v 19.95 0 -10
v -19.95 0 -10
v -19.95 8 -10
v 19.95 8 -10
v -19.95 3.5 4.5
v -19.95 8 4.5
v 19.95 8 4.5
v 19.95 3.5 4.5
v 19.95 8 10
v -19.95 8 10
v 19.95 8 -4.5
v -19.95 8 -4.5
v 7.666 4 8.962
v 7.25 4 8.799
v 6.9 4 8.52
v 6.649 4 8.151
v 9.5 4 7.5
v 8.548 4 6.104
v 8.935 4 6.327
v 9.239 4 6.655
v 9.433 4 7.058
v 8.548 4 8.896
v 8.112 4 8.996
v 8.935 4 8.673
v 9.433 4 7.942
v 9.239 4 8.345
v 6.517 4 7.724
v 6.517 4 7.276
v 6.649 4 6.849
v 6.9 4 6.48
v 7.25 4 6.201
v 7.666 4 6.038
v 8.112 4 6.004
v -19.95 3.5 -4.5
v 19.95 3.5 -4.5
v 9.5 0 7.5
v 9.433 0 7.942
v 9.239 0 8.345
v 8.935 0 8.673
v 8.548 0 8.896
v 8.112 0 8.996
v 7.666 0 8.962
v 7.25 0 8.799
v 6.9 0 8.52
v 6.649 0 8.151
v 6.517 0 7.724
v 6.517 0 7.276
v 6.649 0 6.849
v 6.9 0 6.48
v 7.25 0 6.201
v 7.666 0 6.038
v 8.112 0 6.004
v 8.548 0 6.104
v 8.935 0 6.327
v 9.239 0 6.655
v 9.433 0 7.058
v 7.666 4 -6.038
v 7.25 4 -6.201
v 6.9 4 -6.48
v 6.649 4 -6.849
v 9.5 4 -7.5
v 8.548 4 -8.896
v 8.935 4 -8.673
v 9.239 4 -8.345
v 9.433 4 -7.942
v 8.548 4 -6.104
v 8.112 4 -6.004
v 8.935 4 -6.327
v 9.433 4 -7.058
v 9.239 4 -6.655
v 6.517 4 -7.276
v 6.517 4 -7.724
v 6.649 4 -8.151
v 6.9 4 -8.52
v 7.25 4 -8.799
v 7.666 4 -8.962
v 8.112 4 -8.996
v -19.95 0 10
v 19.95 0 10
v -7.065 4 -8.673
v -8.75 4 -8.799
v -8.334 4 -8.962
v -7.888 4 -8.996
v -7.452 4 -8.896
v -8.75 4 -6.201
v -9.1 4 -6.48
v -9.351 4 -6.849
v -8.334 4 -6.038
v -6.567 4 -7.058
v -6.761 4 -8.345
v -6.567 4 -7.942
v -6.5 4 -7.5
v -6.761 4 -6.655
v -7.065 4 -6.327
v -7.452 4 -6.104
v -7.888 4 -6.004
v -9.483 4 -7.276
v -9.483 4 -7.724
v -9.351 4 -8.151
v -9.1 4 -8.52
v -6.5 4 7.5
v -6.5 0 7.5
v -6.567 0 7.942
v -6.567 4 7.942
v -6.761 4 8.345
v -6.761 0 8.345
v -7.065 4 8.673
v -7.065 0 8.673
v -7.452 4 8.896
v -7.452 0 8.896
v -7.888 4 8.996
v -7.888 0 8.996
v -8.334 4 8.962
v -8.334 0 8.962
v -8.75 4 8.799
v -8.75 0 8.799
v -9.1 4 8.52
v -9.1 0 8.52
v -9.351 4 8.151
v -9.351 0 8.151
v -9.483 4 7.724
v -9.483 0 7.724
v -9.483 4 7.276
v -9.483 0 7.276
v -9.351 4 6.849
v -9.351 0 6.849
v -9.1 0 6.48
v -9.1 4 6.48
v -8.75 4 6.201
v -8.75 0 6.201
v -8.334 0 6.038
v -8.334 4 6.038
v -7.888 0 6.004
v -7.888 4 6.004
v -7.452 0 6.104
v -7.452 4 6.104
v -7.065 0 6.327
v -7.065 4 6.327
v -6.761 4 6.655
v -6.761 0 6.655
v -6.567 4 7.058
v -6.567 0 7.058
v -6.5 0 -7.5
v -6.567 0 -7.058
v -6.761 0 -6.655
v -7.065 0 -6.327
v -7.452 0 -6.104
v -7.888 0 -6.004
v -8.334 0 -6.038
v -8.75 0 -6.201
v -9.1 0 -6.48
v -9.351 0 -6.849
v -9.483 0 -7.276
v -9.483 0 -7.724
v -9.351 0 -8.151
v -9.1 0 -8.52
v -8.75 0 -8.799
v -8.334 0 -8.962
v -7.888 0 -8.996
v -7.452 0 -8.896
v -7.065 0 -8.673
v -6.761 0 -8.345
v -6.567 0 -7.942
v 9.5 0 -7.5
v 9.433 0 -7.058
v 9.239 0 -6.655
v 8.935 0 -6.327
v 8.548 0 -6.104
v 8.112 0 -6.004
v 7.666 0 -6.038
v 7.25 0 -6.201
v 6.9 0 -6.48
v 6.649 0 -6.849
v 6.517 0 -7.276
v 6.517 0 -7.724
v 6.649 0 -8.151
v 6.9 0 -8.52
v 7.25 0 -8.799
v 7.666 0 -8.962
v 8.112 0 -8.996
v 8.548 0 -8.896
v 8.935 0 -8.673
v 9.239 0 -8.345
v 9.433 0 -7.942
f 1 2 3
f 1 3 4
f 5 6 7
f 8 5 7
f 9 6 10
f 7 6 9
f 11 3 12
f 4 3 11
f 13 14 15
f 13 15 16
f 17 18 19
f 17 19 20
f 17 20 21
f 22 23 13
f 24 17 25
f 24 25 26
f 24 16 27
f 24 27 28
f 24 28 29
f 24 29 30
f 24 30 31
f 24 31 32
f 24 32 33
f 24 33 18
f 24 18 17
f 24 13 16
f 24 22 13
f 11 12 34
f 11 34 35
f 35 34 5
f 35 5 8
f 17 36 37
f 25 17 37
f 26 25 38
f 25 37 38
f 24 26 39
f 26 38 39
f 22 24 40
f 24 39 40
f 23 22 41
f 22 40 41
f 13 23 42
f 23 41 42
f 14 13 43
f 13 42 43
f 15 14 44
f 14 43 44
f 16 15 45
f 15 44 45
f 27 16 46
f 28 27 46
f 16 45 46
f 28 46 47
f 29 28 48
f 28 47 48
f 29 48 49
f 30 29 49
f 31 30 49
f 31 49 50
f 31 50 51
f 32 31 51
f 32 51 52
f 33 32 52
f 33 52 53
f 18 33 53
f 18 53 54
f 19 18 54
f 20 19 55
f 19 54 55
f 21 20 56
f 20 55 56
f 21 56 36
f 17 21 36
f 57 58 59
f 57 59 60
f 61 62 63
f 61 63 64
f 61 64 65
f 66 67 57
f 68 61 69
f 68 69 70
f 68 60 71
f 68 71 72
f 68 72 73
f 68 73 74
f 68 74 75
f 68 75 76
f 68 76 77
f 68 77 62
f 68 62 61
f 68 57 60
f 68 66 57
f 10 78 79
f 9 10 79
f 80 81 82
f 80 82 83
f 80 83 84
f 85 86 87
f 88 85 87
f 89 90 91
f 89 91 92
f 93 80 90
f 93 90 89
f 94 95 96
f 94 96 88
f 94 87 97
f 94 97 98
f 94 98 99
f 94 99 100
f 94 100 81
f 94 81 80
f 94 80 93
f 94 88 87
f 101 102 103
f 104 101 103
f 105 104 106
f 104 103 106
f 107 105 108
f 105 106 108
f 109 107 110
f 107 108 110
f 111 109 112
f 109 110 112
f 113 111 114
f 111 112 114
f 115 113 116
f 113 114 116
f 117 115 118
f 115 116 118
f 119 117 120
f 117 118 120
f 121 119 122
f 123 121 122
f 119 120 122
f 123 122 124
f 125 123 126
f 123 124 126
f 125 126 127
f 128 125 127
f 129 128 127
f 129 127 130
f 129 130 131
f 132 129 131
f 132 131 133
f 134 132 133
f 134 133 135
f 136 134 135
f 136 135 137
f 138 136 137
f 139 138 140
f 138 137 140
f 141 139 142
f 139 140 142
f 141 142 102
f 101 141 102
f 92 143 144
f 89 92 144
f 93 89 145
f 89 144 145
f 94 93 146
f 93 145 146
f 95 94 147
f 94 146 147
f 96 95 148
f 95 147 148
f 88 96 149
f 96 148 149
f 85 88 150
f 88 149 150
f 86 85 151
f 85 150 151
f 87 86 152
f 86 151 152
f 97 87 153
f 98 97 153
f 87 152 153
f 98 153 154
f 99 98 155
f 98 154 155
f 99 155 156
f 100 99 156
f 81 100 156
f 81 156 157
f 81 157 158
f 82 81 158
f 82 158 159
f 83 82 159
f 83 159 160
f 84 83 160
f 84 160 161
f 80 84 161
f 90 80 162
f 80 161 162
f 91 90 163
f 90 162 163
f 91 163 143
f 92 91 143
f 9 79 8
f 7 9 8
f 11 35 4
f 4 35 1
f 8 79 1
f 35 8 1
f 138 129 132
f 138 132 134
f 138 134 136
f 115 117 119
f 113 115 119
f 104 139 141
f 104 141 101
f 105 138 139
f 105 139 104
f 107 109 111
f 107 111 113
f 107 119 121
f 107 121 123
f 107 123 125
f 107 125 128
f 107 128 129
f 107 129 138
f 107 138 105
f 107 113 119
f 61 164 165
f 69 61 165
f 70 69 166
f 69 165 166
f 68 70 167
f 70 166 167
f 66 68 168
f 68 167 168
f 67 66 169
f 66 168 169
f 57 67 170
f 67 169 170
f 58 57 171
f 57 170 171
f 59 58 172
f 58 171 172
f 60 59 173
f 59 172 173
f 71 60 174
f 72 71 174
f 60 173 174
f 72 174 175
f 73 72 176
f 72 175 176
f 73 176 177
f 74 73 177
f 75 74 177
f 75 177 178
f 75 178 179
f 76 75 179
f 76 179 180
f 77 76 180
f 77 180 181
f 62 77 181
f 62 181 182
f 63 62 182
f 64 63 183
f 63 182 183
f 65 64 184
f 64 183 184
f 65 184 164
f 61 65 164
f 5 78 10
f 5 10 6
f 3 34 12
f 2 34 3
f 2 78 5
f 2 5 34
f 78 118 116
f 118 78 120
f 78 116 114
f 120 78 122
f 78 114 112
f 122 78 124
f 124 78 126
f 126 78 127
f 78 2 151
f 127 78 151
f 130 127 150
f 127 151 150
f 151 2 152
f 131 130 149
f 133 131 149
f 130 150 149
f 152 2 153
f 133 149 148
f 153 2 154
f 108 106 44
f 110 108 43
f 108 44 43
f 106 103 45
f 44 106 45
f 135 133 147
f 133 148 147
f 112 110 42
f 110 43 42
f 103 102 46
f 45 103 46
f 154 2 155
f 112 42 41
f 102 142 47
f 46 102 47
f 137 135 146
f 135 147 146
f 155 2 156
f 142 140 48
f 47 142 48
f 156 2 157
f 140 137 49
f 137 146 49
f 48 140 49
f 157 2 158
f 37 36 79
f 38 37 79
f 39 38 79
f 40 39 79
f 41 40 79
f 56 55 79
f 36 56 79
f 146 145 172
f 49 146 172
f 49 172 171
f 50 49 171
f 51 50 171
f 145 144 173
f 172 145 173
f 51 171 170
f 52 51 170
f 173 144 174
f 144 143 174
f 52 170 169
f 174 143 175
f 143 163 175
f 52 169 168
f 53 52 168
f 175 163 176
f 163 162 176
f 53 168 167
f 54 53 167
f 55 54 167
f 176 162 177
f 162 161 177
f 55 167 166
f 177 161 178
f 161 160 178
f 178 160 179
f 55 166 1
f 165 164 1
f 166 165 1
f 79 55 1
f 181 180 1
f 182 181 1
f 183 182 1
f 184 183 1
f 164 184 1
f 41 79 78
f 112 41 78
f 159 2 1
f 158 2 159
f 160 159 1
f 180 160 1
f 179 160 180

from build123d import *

# Parameters (mm, degrees)
SKETCH_1_W          = 39.9
SKETCH_1_H          = 20
EXTRUDE_1_DEPTH     = 8
SKETCH_2_W          = 39.9
SKETCH_2_H          = 9
CUT_EXTRUDE_1_DEPTH = 4.5
SKETCH_3_R          = 1.5
CUT_EXTRUDE_2_DEPTH = 4


with BuildPart() as part:
    # 草图1 → 凸台-拉伸1 (new body)
    with BuildSketch(Plane(origin=(0, 0, 0), x_dir=(1, 0, 0), z_dir=(0, 1, 0))):
        Rectangle(SKETCH_1_W, SKETCH_1_H)
    extrude(amount=EXTRUDE_1_DEPTH)

    # 草图2 → 切除-拉伸1 (cut)
    with BuildSketch(Plane(origin=(0, 8, 0), x_dir=(1, 0, 0), z_dir=(0, 1, 0))):
        Rectangle(SKETCH_2_W, SKETCH_2_H)
    extrude(amount=-CUT_EXTRUDE_1_DEPTH, mode=Mode.SUBTRACT)

    # 草图3 → 切除-拉伸2 (cut)
    with BuildSketch(Plane.XZ):
        with Locations((-8, 7.5)):
            Circle(SKETCH_3_R)
        with Locations((8, 7.5)):
            Circle(SKETCH_3_R)
        with Locations((8, -7.5)):
            Circle(SKETCH_3_R)
        with Locations((-8, -7.5)):
            Circle(SKETCH_3_R)
    extrude(amount=-CUT_EXTRUDE_2_DEPTH, mode=Mode.SUBTRACT)


solid = part.part
